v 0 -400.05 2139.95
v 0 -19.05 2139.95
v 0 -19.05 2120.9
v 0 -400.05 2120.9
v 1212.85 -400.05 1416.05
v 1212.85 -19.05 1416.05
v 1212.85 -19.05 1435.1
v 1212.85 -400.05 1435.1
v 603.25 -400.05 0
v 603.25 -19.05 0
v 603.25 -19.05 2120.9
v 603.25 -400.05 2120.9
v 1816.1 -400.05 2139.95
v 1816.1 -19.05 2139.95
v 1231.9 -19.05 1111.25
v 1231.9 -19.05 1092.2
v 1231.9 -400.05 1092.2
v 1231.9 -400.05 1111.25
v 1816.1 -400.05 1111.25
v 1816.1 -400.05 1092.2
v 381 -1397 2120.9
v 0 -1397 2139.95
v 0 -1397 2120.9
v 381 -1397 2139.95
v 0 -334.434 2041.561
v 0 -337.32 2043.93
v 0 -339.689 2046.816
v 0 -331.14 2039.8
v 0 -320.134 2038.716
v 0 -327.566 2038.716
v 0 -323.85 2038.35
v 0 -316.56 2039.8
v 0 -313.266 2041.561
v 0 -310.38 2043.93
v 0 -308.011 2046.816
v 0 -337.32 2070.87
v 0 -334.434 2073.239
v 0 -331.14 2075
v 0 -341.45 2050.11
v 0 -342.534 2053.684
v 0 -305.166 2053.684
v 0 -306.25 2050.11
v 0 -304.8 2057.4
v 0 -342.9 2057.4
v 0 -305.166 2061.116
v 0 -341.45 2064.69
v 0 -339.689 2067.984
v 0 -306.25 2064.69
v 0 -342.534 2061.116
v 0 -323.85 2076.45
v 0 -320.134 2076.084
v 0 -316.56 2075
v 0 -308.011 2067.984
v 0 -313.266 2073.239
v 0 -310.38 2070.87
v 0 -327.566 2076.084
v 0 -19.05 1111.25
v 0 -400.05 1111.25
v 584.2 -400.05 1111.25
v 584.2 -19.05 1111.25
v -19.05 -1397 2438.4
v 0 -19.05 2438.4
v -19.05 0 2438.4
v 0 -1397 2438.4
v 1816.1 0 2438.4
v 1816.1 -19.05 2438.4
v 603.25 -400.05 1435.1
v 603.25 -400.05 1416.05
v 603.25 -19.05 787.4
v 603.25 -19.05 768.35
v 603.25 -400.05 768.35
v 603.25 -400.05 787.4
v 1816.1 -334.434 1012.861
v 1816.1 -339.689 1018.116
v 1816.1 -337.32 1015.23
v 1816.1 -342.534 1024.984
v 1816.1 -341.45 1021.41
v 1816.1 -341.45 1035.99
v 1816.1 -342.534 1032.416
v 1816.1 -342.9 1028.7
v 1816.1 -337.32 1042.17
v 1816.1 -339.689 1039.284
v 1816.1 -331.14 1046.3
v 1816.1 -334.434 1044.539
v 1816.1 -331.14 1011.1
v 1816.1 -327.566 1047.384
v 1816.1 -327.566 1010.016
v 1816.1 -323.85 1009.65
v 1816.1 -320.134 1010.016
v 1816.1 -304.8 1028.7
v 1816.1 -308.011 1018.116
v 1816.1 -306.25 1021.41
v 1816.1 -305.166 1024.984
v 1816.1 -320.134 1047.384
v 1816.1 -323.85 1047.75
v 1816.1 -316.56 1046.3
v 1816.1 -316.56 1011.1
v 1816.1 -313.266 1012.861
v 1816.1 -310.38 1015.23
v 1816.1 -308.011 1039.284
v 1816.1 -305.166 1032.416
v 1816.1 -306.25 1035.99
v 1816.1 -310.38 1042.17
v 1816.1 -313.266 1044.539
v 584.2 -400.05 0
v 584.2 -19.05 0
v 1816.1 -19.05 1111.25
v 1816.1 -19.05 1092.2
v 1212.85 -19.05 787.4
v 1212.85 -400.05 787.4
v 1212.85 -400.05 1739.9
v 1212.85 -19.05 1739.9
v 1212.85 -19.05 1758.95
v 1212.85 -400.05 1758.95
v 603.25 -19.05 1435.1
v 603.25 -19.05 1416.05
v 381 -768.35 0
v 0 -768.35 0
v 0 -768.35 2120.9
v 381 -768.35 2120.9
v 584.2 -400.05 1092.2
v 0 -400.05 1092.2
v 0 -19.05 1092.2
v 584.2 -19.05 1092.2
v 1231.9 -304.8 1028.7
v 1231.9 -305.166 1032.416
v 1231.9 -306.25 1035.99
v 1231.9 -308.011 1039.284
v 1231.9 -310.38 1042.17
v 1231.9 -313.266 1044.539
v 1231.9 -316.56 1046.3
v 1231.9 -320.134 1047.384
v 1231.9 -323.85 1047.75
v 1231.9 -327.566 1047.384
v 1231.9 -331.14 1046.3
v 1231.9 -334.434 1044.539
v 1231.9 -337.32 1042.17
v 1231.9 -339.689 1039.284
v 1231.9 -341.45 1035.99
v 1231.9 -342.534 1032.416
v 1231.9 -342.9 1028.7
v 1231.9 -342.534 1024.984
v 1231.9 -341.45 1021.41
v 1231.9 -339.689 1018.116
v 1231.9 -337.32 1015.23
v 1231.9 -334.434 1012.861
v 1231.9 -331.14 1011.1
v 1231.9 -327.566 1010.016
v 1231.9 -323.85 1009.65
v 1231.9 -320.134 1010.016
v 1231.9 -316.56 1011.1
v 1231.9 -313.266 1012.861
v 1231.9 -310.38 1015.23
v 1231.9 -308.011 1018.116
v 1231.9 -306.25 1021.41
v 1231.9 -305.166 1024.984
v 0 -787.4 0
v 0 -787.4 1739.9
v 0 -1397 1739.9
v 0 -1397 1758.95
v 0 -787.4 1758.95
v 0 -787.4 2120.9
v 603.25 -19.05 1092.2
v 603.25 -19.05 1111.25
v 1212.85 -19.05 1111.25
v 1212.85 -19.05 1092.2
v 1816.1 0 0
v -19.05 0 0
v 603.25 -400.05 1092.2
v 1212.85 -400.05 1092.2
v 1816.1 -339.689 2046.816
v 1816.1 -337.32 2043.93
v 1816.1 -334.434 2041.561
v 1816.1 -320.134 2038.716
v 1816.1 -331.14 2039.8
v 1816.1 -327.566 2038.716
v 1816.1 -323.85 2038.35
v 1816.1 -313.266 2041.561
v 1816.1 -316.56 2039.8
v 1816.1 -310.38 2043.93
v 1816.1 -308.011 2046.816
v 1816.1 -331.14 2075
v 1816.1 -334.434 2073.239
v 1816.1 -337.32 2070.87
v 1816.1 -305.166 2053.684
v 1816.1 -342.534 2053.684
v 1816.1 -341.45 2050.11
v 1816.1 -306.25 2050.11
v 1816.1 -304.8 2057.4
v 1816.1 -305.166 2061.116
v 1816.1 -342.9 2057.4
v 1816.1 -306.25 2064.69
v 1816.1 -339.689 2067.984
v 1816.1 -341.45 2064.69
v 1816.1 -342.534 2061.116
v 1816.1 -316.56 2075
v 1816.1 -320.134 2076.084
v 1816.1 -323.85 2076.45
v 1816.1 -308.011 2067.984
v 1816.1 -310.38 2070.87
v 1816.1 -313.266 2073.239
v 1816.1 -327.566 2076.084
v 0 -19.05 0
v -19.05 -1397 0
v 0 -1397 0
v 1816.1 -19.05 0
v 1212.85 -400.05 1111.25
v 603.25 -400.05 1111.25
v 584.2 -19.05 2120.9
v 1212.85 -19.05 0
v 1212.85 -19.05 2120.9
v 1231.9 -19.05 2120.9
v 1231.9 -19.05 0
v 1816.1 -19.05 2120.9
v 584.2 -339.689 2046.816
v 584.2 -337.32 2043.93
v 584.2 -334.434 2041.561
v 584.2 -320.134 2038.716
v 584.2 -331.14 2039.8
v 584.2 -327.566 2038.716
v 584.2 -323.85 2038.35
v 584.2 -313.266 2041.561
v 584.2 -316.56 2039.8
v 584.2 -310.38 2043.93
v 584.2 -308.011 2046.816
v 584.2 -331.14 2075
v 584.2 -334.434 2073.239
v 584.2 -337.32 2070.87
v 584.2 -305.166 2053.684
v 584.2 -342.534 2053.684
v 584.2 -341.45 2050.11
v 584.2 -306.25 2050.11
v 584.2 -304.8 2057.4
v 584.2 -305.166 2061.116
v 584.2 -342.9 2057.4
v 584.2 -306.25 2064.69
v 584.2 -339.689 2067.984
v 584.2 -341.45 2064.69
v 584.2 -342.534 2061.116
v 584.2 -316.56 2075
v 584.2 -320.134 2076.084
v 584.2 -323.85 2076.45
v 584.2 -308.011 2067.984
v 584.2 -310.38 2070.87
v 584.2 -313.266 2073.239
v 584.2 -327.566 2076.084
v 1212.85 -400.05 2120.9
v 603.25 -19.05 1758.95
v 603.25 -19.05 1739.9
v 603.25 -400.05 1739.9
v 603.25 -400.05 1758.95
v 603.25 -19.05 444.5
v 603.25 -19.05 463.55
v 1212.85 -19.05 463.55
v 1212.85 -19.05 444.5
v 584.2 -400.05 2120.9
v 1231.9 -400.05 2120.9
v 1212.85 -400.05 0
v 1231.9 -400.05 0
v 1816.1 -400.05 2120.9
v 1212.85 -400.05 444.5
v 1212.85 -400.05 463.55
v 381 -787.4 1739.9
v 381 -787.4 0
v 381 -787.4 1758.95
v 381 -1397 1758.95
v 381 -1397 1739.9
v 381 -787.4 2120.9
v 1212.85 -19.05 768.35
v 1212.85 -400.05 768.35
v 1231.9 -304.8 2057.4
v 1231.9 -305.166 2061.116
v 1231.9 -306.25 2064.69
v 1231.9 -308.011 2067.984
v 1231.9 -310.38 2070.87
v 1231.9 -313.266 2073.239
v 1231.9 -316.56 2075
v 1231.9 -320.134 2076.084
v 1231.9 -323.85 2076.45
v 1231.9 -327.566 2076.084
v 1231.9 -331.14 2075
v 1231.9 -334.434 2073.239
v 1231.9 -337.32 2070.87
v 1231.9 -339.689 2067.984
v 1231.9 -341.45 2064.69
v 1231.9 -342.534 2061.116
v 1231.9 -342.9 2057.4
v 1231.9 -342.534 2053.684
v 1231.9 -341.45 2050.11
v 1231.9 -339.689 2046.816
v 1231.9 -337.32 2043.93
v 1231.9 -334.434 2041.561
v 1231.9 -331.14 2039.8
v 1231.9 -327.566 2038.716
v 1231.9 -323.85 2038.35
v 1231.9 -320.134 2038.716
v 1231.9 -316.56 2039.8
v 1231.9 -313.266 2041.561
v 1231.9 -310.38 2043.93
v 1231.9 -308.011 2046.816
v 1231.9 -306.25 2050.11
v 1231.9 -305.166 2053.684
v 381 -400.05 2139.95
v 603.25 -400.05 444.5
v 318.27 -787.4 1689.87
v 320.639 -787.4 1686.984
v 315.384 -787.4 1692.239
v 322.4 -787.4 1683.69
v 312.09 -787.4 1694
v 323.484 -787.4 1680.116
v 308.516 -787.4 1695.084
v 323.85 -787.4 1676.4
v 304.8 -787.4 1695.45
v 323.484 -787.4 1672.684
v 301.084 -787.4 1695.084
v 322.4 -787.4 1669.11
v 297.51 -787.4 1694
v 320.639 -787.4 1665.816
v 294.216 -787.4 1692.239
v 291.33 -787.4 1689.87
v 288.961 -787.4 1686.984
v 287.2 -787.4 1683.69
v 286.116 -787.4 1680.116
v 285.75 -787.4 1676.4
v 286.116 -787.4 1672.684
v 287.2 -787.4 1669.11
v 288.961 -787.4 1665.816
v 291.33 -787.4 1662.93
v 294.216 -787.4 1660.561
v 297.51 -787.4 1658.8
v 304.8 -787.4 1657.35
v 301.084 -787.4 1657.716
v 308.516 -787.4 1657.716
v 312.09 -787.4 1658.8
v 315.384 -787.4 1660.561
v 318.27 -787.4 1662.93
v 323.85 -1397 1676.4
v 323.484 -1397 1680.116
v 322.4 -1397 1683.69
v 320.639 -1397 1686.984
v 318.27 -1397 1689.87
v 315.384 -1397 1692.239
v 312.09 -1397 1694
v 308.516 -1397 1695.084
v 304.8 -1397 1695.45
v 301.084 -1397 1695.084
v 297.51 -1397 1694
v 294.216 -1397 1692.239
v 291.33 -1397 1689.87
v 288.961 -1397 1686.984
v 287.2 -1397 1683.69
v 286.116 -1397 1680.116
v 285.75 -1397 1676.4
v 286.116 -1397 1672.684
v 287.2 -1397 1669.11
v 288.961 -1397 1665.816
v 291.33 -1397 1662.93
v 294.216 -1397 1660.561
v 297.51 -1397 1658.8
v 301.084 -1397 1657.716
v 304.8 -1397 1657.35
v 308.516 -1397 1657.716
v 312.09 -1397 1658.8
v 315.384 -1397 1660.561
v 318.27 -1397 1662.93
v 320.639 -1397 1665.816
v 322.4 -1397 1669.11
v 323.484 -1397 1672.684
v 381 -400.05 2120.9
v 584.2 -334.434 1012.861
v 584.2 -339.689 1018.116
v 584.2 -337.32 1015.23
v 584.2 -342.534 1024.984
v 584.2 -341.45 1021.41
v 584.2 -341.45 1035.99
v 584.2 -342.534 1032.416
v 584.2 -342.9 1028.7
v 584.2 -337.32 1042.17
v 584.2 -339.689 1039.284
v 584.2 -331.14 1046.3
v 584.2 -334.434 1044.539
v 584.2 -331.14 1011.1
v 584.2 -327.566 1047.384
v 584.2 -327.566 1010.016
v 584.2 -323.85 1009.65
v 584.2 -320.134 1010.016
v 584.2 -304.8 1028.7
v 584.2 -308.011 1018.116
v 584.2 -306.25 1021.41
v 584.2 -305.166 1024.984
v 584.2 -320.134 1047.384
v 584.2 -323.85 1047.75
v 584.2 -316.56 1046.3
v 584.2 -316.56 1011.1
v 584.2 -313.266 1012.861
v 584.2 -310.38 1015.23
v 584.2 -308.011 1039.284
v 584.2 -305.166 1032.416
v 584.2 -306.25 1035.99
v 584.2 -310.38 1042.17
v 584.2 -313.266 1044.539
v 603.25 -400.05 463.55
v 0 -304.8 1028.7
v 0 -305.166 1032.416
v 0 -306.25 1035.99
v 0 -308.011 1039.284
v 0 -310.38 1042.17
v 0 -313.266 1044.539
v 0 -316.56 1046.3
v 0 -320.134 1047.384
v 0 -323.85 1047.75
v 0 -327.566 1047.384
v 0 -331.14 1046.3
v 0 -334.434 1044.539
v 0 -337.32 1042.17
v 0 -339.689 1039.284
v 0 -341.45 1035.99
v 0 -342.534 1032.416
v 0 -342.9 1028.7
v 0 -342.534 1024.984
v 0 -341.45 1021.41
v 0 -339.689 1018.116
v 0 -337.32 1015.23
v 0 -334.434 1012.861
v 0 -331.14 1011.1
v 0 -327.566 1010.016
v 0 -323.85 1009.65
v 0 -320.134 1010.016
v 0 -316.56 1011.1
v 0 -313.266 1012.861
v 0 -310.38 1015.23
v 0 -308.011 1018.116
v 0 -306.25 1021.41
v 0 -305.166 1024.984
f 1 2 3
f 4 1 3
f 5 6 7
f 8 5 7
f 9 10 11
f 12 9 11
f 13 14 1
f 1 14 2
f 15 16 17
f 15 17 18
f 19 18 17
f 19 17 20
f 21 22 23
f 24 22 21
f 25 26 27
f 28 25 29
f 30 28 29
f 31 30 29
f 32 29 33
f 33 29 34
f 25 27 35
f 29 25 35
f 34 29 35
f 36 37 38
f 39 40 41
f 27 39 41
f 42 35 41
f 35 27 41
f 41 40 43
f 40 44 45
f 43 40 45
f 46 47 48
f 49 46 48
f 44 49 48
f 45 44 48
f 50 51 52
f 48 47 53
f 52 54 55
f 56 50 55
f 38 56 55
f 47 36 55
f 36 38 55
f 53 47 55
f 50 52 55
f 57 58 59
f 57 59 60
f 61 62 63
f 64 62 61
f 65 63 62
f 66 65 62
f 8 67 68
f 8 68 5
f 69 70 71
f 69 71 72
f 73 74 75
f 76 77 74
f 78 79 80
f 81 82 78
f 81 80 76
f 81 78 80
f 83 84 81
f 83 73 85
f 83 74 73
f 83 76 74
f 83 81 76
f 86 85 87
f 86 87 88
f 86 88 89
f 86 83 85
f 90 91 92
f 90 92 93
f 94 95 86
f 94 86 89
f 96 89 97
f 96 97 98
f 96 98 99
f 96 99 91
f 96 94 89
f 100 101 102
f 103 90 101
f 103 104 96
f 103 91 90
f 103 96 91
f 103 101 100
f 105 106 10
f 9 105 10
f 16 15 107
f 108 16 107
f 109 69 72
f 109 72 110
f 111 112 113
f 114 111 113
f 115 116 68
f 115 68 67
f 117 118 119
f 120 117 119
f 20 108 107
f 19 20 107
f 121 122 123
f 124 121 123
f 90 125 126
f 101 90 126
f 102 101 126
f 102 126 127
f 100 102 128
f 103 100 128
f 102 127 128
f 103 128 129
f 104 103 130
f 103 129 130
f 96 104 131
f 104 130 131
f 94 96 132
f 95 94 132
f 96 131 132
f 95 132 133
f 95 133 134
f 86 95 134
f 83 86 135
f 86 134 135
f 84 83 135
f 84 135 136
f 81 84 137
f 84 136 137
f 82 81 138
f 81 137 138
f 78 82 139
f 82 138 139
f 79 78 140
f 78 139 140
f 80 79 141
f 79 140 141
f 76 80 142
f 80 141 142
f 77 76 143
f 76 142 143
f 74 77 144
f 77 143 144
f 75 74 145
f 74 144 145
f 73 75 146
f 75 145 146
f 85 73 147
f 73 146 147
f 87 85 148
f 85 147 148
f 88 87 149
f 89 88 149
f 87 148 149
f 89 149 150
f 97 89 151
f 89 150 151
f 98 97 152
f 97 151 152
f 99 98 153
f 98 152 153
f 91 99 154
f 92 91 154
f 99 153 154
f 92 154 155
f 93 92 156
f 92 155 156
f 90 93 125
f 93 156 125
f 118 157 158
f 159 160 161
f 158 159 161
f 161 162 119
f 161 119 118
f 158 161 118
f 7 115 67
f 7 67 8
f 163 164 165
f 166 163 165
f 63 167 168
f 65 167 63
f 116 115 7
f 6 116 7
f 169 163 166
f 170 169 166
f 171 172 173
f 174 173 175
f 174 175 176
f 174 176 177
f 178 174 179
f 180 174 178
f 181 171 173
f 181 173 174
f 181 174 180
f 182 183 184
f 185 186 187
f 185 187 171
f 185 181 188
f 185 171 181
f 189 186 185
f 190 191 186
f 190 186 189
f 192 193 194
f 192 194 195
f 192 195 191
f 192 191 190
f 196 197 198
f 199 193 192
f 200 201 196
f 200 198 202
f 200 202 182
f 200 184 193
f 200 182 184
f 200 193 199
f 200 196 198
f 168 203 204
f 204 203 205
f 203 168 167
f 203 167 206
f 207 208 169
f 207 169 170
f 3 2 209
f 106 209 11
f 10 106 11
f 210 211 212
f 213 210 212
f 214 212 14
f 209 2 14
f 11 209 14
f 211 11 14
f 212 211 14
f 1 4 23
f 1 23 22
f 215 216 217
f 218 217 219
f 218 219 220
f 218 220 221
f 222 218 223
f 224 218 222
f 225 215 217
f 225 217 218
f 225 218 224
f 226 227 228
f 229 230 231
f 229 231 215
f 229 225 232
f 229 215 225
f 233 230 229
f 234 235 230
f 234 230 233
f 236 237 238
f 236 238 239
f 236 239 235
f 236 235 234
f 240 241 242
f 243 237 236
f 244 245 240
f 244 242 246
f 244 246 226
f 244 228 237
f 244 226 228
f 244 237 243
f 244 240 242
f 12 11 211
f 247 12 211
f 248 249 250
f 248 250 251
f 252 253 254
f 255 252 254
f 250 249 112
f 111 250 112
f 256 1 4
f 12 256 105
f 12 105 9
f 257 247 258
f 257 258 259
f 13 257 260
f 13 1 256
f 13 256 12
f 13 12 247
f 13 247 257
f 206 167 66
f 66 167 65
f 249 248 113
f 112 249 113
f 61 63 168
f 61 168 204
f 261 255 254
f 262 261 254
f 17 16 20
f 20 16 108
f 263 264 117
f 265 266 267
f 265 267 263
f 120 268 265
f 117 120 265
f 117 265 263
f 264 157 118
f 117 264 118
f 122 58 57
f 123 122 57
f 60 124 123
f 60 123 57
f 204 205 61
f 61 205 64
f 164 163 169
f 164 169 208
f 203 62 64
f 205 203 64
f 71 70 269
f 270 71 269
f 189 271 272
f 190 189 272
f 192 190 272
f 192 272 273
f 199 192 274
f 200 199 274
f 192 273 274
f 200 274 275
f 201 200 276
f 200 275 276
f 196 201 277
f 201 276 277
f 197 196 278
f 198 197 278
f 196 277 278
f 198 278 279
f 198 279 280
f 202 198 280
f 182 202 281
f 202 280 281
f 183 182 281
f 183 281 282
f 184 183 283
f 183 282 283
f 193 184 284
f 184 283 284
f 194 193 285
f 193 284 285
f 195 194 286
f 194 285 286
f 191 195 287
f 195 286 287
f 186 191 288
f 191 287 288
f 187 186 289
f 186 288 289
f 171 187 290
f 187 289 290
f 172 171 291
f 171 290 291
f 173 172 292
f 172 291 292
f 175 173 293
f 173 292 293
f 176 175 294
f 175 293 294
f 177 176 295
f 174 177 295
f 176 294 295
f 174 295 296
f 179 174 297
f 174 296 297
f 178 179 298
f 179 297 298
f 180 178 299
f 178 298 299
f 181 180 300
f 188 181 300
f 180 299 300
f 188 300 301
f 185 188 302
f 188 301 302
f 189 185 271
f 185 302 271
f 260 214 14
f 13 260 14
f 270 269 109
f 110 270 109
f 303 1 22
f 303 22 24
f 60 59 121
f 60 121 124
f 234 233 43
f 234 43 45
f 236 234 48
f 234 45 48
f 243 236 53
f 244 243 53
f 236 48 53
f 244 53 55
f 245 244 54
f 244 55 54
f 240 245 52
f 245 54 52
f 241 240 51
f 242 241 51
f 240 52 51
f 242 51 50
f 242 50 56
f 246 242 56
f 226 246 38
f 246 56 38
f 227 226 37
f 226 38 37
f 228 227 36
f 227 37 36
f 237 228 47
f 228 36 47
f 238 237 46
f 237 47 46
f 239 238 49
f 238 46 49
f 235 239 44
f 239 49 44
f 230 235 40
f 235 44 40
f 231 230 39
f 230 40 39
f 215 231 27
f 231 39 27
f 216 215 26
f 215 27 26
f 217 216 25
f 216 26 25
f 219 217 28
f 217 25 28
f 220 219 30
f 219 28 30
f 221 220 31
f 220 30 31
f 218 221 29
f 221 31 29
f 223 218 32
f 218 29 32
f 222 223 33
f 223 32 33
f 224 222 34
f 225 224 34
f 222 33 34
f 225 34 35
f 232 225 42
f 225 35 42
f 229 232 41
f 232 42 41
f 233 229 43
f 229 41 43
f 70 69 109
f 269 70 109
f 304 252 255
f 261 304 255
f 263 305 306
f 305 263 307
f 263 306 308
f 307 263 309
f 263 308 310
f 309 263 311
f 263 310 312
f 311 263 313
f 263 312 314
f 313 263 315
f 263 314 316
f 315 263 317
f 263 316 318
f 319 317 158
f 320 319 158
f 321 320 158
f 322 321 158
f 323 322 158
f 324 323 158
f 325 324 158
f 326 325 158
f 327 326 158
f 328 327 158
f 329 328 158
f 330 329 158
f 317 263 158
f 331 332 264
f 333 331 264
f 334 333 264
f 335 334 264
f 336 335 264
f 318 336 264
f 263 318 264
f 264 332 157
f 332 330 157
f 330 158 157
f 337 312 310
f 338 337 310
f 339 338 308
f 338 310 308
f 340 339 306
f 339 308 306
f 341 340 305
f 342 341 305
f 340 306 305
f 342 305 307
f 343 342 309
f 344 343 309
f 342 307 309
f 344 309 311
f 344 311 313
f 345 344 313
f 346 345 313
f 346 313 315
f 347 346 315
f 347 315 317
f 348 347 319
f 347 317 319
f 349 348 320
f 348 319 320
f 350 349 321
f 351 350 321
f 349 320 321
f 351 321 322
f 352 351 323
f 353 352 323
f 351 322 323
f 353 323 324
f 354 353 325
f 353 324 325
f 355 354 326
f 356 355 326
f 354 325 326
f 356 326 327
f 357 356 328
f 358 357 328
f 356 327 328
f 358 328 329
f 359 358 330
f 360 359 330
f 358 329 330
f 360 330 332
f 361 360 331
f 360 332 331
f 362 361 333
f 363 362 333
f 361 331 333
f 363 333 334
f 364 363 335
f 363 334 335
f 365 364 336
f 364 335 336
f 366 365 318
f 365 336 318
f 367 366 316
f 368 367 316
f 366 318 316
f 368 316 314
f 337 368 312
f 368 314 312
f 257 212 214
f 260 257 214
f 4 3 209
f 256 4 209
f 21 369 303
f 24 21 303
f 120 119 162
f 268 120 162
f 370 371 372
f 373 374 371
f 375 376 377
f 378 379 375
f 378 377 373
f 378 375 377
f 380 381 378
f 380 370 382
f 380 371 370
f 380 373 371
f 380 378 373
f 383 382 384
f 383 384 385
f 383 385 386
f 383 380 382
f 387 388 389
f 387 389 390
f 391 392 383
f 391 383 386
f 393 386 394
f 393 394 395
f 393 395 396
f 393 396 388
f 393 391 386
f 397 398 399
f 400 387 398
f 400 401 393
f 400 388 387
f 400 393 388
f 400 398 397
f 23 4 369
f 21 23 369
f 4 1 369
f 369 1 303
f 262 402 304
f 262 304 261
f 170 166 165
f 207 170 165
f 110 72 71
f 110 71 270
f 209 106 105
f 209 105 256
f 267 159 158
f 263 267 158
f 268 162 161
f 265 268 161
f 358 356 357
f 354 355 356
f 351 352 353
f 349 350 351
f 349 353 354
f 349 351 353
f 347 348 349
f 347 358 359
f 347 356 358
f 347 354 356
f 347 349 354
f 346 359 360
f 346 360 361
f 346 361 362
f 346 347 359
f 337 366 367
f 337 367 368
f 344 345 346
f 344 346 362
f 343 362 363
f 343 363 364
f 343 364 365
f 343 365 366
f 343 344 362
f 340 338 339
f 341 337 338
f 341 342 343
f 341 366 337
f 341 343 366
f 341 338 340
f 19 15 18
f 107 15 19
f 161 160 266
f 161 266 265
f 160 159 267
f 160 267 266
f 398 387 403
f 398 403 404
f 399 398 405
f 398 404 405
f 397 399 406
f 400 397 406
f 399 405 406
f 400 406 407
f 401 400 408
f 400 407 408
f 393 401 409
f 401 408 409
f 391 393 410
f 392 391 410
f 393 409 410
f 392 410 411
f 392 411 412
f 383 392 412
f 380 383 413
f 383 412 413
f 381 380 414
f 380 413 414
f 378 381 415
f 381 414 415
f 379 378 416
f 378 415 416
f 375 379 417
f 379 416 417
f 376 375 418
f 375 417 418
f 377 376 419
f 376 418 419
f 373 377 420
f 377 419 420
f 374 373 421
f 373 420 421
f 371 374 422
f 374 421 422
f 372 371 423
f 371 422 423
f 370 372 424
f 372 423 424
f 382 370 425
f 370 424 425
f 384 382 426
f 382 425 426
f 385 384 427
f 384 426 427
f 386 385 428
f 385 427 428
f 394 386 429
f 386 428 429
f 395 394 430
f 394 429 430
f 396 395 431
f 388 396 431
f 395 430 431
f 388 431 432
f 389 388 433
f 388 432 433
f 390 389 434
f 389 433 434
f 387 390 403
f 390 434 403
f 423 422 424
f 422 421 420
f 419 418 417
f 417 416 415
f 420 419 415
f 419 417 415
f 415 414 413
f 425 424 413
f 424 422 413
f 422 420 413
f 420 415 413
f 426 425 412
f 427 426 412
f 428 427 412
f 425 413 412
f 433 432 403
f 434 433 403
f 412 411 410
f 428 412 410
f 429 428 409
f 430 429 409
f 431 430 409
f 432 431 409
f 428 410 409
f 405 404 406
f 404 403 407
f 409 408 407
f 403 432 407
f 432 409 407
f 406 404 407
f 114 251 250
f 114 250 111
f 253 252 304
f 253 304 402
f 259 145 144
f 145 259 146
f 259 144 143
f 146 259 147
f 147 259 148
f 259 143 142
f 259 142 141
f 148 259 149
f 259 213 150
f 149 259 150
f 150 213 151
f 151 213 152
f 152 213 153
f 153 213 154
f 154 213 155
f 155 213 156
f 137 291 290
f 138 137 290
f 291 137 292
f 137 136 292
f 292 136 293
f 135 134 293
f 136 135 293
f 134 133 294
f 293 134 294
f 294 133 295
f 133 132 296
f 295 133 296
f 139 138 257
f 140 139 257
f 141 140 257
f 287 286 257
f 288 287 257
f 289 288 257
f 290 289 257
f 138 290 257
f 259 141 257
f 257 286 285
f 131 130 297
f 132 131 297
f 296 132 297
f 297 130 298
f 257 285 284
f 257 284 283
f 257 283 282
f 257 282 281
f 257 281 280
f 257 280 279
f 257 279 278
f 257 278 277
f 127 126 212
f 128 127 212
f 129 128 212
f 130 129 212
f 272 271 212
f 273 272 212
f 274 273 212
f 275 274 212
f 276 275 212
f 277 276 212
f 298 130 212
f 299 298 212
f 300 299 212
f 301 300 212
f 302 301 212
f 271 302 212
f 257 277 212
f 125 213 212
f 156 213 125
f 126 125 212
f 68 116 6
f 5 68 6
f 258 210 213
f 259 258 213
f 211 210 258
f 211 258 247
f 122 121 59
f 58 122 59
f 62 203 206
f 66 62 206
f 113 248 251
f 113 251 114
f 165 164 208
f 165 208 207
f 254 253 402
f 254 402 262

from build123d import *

# Parameters (mm, degrees)
F0_W      = 1816.1
F0_H      = 2438.4
F1_DEPTH  = 19.05
F2_W      = 1397
F2_H      = 2438.4
F3_DEPTH  = 19.05
F4_R      = 19.05
F4_W      = 381
F4_H      = 19.05
F5_DEPTH  = 584.2
F6_W      = 19.05
F6_H      = 2120.9
F7_DEPTH  = 381
F8_W      = 609.6
F8_H      = 19.05
F8_W_2    = 584.2
F9_DEPTH  = 381
F10_W     = 381
F10_H     = 19.05
F11_DEPTH = 996.95
F12_W     = 609.6
F12_H     = 19.05
F13_DEPTH = 381
F14_R     = 19.05
F15_DEPTH = 609.6
F16_R     = 19.05
F17_DEPTH = 584.2


with BuildPart() as f1:
    # F0 (on Front) → F1 (new body)
    with BuildSketch(Plane.XZ):
        with Locations((908.05, 1219.2)):
            Rectangle(F0_W, F0_H)
    extrude(amount=F1_DEPTH)

    # F2 (on face) → F3 (join)
    with BuildSketch(Plane(origin=(0, 0, 0), x_dir=(0, -1, 0), z_dir=(-1, 0, 0))):
        with Locations((698.5, 1219.2)):
            Rectangle(F2_W, F2_H)
    extrude(amount=F3_DEPTH)


with BuildPart() as f5:
    # F4 (on face) → F5 (new body)
    with BuildSketch(Plane.YZ):
        with Locations((-323.85, 2057.4)):
            Circle(F4_R)
        with Locations((-323.85, 1028.7)):
            Circle(F4_R)
        with Locations((-209.55, 1101.725)):
            Rectangle(F4_W, F4_H)
    extrude(amount=F5_DEPTH)


with BuildPart() as f7:
    # F6 (on face) → F7 (new body)
    with BuildSketch(Plane.XZ.offset(19.05)):
        with Locations((593.725, 1060.45)):
            Rectangle(F6_W, F6_H)
        Polygon((0, 2120.9), (584.2, 2120.9), (603.25, 2120.9), (1212.85, 2120.9), (1231.9, 2120.9), (1816.1, 2120.9), (1816.1, 2139.95), (0, 2139.95), align=None)
        with Locations((1222.375, 1060.45)):
            Rectangle(F6_W, F6_H)
    extrude(amount=F7_DEPTH)

    # F16 (on face) → F17 (join, through all)
    with BuildSketch(Plane.YZ.offset(1231.9)):
        with Locations((-323.85, 2057.4)):
            Circle(F16_R)
        with Locations((-323.85, 1028.7)):
            Circle(F16_R)
    extrude(amount=F17_DEPTH)


with BuildPart() as f9:
    # F8 (on face) → F9 (new body)
    with BuildSketch(Plane.XZ.offset(19.05)):
        with Locations((908.05, 1101.725)):
            Rectangle(F8_W, F8_H)
        with Locations((908.05, 777.875)):
            Rectangle(F8_W, F8_H)
        with Locations((908.05, 1425.575)):
            Rectangle(F8_W, F8_H)
        with Locations((908.05, 1749.425)):
            Rectangle(F8_W, F8_H)
        with Locations((908.05, 454.025)):
            Rectangle(F8_W, F8_H)
        with Locations((1524, 1101.725)):
            Rectangle(F8_W_2, F8_H)
    extrude(amount=F9_DEPTH)


with BuildPart() as f11:
    # F10 (on face) → F11 (new body, through all)
    with BuildSketch(Plane.XZ.offset(400.05)):
        with Locations((190.5, 2130.425)):
            Rectangle(F10_W, F10_H)
    extrude(amount=F11_DEPTH)


with BuildPart() as f13:
    # F12 (on face) → F13 (new body)
    with BuildSketch(Plane.YZ):
        Polygon((-787.4, 1739.9), (-787.4, 0), (-768.35, 0), (-768.35, 2120.9), (-787.4, 2120.9), (-787.4, 1758.95), align=None)
        with Locations((-1092.2, 1749.425)):
            Rectangle(F12_W, F12_H)
    extrude(amount=F13_DEPTH)

    # F14 (on face) → F15 (join, through all)
    with BuildSketch(Plane.XZ.offset(787.4)):
        with Locations((304.8, 1676.4)):
            Circle(F14_R)
    extrude(amount=F15_DEPTH)


solid = Compound([f1.part, f5.part, f7.part, f9.part, f11.part, f13.part])
